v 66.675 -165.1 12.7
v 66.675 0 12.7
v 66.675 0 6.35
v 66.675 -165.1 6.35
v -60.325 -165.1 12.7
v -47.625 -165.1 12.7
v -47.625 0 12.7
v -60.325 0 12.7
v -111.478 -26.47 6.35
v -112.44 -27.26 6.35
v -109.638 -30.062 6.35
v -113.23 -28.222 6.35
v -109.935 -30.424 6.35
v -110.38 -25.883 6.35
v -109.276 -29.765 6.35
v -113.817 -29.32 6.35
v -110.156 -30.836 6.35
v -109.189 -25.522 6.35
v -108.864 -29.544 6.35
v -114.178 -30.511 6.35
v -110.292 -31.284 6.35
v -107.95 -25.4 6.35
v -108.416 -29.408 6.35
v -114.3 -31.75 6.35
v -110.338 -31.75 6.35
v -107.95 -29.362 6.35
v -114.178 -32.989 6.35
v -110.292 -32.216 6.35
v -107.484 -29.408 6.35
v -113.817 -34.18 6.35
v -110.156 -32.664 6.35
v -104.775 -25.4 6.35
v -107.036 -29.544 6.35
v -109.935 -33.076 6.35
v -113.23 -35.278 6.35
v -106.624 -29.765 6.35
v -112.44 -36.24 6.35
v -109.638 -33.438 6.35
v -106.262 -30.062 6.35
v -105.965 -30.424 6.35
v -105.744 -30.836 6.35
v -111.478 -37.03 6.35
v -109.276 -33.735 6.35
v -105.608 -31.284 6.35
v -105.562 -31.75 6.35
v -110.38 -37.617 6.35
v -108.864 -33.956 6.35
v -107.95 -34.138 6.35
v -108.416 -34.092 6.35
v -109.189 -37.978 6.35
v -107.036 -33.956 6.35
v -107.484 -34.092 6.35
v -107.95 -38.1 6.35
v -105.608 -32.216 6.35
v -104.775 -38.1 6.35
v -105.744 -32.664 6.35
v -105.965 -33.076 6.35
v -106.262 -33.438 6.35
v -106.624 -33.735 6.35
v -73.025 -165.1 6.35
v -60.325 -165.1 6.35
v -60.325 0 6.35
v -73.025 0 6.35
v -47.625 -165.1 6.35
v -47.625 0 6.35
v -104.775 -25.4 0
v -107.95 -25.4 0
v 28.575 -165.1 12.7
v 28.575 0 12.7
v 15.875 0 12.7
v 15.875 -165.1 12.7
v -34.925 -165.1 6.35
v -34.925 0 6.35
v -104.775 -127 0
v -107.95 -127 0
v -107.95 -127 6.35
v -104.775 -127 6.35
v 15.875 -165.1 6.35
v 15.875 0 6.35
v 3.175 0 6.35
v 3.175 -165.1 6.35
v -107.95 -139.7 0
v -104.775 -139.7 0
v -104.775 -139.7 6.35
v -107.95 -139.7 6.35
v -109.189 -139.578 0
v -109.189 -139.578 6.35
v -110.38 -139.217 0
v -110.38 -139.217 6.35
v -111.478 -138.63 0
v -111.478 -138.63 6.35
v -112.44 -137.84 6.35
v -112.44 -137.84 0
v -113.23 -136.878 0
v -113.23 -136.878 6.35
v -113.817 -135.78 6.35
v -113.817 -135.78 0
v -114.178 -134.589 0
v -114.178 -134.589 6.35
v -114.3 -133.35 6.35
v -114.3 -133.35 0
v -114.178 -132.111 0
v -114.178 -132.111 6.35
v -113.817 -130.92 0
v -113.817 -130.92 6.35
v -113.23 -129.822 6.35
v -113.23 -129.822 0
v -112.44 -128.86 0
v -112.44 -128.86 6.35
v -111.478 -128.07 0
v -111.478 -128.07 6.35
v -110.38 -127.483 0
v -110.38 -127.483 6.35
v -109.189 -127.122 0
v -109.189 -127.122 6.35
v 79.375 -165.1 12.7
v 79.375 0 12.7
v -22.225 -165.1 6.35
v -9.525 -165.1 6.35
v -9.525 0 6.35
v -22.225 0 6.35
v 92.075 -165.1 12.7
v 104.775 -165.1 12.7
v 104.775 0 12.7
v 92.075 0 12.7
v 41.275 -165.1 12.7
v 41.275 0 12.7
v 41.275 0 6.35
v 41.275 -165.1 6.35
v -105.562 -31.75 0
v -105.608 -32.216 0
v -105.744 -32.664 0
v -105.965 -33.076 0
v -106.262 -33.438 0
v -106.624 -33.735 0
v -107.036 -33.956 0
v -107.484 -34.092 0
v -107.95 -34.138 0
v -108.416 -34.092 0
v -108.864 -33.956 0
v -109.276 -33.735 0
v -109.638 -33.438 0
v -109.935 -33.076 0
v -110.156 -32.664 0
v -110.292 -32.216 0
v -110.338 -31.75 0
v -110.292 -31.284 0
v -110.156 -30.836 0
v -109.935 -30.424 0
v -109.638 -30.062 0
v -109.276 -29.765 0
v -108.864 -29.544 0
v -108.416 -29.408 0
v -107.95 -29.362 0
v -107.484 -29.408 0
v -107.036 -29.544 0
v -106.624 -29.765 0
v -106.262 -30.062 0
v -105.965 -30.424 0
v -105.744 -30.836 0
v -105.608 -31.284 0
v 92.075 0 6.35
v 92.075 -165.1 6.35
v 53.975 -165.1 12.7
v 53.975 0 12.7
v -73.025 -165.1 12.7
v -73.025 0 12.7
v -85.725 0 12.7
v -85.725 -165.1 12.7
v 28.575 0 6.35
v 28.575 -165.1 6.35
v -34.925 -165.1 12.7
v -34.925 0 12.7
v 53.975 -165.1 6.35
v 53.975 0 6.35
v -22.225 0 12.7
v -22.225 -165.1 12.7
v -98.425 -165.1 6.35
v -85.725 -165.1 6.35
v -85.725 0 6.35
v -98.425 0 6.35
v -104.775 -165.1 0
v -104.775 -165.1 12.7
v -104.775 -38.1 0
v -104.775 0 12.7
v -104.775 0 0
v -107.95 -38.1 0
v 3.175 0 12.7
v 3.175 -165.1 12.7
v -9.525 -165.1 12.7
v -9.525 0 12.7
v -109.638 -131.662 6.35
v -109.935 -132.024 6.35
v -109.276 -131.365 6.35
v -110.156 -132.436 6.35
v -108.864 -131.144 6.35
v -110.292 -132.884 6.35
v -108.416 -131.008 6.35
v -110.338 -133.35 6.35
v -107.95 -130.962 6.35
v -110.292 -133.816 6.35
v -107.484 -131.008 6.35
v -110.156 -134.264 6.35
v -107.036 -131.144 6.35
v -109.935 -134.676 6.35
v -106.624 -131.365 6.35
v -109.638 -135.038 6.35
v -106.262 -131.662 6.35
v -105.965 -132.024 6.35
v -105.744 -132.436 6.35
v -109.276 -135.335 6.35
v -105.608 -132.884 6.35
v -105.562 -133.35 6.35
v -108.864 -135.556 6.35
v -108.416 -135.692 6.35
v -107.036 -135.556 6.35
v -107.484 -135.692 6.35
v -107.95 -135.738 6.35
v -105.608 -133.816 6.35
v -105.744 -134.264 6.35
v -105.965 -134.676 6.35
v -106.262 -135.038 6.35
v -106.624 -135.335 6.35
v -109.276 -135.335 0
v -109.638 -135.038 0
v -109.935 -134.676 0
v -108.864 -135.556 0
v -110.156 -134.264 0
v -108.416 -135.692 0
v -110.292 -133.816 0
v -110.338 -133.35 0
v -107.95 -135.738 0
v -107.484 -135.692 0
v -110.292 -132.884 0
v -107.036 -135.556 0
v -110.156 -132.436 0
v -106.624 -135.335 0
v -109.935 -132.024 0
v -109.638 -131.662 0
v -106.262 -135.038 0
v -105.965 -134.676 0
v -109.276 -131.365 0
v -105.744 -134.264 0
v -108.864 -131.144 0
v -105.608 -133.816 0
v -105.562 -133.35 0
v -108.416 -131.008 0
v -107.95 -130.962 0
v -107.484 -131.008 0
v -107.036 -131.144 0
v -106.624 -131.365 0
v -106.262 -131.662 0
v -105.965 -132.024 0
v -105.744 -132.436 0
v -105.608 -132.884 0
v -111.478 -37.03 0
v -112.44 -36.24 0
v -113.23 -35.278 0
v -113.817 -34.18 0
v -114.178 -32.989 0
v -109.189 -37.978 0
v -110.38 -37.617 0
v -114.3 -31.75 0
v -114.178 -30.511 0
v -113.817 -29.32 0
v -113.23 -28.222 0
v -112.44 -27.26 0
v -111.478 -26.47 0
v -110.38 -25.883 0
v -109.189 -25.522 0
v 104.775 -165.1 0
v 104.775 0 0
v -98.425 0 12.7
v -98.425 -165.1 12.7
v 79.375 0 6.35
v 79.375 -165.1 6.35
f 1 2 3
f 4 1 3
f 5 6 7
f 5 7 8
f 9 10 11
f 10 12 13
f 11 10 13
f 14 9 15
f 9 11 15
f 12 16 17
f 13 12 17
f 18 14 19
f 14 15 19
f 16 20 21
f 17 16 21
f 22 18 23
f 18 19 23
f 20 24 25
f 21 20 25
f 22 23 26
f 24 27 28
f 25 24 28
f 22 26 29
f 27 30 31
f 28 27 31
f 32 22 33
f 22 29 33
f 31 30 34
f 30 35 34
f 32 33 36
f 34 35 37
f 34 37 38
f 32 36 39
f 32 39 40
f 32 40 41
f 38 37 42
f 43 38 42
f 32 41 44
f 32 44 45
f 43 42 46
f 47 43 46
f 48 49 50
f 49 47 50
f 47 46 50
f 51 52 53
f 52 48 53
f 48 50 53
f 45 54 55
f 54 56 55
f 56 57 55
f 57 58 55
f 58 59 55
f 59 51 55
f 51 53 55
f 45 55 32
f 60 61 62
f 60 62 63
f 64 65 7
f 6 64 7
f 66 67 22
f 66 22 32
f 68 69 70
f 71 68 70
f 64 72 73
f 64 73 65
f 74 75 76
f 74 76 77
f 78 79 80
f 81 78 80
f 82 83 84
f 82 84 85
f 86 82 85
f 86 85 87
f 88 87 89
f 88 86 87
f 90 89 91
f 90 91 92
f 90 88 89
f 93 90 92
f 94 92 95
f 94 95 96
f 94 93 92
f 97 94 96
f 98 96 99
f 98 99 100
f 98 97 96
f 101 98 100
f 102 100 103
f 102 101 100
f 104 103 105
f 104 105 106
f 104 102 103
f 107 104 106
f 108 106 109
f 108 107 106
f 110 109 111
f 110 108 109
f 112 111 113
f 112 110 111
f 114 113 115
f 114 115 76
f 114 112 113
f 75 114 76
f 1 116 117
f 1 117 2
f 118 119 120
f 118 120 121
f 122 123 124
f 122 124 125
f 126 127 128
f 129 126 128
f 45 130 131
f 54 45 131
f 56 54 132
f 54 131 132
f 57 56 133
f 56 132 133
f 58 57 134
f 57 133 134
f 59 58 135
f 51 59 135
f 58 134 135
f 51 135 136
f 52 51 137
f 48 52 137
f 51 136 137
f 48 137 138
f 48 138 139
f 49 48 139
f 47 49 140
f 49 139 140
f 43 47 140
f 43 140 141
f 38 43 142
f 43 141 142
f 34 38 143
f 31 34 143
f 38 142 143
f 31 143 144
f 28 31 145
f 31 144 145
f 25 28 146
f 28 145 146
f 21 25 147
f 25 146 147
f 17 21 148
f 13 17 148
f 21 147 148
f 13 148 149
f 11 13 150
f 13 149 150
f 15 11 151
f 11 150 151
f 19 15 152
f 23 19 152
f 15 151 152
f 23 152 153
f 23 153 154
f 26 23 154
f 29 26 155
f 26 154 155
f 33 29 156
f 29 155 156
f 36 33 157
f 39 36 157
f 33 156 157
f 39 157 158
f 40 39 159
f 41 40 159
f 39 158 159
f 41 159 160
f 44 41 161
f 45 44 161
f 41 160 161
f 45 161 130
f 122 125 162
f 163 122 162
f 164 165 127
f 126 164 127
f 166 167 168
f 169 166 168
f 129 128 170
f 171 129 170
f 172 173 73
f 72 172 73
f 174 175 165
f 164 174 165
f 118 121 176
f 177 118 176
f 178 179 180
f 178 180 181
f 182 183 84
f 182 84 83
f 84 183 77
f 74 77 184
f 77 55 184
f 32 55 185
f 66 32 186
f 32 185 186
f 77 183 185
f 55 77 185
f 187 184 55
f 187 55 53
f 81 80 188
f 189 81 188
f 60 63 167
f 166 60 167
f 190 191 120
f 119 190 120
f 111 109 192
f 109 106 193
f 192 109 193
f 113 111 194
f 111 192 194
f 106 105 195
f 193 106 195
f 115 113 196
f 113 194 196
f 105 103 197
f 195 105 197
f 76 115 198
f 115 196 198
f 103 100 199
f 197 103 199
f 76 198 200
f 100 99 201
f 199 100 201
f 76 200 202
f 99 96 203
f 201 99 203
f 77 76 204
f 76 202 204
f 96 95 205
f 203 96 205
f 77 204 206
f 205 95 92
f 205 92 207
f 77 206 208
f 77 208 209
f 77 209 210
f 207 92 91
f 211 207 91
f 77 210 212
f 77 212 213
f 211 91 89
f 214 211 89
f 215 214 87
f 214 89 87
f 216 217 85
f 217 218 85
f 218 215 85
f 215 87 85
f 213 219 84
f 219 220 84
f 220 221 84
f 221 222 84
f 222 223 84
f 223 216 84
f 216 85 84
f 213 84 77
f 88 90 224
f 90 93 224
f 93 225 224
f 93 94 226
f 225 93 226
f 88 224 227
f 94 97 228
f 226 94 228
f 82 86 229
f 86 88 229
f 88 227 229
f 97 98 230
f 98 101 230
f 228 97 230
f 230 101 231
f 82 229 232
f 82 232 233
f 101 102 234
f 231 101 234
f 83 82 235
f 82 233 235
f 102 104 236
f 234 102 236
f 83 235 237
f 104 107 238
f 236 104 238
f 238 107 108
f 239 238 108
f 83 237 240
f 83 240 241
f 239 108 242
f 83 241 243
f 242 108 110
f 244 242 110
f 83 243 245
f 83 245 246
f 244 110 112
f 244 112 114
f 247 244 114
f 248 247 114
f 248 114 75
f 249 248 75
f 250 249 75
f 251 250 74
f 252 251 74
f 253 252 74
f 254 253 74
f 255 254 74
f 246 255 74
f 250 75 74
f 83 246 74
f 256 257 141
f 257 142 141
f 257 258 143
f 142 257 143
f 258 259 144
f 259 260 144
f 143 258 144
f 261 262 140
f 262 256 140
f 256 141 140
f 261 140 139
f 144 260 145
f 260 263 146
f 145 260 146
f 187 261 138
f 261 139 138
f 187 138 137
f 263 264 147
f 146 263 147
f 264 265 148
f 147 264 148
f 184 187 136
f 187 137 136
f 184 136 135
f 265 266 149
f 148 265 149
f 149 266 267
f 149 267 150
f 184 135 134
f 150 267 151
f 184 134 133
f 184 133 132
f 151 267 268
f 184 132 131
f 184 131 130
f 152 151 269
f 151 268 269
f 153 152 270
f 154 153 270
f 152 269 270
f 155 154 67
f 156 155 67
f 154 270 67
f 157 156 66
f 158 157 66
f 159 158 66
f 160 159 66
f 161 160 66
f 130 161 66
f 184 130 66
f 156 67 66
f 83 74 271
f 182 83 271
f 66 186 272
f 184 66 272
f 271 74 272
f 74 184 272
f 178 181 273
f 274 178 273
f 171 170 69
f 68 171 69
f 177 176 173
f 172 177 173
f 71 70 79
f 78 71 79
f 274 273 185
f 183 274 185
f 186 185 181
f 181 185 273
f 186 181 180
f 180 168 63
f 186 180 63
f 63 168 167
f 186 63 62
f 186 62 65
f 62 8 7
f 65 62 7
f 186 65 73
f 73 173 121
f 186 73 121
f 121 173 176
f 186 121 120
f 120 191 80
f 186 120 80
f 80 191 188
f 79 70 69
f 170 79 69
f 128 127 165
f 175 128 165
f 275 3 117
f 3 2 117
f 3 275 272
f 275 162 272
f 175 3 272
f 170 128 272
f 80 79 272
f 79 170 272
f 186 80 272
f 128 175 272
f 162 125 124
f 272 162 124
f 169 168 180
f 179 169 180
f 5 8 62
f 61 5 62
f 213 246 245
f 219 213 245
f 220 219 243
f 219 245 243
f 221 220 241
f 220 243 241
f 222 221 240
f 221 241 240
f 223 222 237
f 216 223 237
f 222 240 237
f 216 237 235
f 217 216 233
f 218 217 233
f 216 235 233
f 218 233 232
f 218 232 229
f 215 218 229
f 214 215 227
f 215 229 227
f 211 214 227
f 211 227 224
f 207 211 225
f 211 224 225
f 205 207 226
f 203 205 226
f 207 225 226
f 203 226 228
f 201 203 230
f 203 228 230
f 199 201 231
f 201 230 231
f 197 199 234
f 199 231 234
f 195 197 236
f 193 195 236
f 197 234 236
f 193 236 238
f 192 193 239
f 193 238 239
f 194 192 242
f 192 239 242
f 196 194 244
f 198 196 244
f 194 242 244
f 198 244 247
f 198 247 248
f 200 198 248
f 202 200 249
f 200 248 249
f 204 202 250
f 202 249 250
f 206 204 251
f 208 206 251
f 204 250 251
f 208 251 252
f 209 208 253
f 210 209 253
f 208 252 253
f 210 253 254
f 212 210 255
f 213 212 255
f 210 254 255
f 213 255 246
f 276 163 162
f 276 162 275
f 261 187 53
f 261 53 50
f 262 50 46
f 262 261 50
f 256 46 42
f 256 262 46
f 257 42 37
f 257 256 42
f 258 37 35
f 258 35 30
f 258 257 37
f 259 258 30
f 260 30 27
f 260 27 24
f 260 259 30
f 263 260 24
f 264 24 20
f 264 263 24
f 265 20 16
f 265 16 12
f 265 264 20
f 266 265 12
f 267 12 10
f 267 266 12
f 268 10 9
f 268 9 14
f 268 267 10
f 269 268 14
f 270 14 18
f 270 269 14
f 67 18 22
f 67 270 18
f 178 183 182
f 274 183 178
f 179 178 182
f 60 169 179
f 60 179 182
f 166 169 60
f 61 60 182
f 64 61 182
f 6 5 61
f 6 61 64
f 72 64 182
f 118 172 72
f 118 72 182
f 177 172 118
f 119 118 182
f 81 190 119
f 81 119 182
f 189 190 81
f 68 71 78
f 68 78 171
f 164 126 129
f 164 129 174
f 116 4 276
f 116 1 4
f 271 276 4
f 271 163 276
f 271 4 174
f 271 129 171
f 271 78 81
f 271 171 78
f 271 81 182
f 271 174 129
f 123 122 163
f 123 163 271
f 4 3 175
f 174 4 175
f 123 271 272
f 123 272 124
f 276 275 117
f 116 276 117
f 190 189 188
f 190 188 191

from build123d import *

# Parameters (mm, degrees)
F1_DEPTH = 165.1
F2_R     = 2.3876
F3_DEPTH = 6.35


with BuildPart() as f1:
    # F0 (on Front) → F1 (new body)
    with BuildSketch(Plane.XZ):
        Polygon((-104.775, 12.7), (-104.775, 0), (104.775, 0), (104.775, 12.7), (92.075, 12.7), (92.075, 6.35), (79.375, 6.35), (79.375, 12.7), (66.675, 12.7), (66.675, 6.35), (53.975, 6.35), (53.975, 12.7), (41.275, 12.7), (41.275, 6.35), (28.575, 6.35), (28.575, 12.7), (15.875, 12.7), (15.875, 6.35), (3.175, 6.35), (3.175, 12.7), (-9.525, 12.7), (-9.525, 6.35), (-22.225, 6.35), (-22.225, 12.7), (-34.925, 12.7), (-34.925, 6.35), (-47.625, 6.35), (-47.625, 12.7), (-60.325, 12.7), (-60.325, 6.35), (-73.025, 6.35), (-73.025, 12.7), (-85.725, 12.7), (-85.725, 6.35), (-98.425, 6.35), (-98.425, 12.7), align=None)
    extrude(amount=F1_DEPTH)

    # F2 (on face) → F3 (join)
    with BuildSketch(Plane(origin=(0, 0, 0), x_dir=(1, 0, 0), z_dir=(0, 0, -1))):
        with BuildLine():
            Line((-107.95, 25.4), (-104.775, 25.4))
            Line((-104.775, 25.4), (-104.775, 38.1))
            Line((-104.775, 38.1), (-107.95, 38.1))
            ThreePointArc((-107.95, 38.1), (-114.3, 31.75), (-107.95, 25.4))
        make_face()
        with Locations((-107.95, 31.75)):
            Circle(F2_R, mode=Mode.SUBTRACT)
        with BuildLine():
            ThreePointArc((-107.95, 139.7), (-114.3, 133.35), (-107.95, 127))
            Line((-107.95, 127), (-104.775, 127))
            Line((-104.775, 127), (-104.775, 139.7))
            Line((-104.775, 139.7), (-107.95, 139.7))
        make_face()
        with Locations((-107.95, 133.35)):
            Circle(F2_R, mode=Mode.SUBTRACT)
    extrude(amount=-F3_DEPTH)


solid = f1.part
